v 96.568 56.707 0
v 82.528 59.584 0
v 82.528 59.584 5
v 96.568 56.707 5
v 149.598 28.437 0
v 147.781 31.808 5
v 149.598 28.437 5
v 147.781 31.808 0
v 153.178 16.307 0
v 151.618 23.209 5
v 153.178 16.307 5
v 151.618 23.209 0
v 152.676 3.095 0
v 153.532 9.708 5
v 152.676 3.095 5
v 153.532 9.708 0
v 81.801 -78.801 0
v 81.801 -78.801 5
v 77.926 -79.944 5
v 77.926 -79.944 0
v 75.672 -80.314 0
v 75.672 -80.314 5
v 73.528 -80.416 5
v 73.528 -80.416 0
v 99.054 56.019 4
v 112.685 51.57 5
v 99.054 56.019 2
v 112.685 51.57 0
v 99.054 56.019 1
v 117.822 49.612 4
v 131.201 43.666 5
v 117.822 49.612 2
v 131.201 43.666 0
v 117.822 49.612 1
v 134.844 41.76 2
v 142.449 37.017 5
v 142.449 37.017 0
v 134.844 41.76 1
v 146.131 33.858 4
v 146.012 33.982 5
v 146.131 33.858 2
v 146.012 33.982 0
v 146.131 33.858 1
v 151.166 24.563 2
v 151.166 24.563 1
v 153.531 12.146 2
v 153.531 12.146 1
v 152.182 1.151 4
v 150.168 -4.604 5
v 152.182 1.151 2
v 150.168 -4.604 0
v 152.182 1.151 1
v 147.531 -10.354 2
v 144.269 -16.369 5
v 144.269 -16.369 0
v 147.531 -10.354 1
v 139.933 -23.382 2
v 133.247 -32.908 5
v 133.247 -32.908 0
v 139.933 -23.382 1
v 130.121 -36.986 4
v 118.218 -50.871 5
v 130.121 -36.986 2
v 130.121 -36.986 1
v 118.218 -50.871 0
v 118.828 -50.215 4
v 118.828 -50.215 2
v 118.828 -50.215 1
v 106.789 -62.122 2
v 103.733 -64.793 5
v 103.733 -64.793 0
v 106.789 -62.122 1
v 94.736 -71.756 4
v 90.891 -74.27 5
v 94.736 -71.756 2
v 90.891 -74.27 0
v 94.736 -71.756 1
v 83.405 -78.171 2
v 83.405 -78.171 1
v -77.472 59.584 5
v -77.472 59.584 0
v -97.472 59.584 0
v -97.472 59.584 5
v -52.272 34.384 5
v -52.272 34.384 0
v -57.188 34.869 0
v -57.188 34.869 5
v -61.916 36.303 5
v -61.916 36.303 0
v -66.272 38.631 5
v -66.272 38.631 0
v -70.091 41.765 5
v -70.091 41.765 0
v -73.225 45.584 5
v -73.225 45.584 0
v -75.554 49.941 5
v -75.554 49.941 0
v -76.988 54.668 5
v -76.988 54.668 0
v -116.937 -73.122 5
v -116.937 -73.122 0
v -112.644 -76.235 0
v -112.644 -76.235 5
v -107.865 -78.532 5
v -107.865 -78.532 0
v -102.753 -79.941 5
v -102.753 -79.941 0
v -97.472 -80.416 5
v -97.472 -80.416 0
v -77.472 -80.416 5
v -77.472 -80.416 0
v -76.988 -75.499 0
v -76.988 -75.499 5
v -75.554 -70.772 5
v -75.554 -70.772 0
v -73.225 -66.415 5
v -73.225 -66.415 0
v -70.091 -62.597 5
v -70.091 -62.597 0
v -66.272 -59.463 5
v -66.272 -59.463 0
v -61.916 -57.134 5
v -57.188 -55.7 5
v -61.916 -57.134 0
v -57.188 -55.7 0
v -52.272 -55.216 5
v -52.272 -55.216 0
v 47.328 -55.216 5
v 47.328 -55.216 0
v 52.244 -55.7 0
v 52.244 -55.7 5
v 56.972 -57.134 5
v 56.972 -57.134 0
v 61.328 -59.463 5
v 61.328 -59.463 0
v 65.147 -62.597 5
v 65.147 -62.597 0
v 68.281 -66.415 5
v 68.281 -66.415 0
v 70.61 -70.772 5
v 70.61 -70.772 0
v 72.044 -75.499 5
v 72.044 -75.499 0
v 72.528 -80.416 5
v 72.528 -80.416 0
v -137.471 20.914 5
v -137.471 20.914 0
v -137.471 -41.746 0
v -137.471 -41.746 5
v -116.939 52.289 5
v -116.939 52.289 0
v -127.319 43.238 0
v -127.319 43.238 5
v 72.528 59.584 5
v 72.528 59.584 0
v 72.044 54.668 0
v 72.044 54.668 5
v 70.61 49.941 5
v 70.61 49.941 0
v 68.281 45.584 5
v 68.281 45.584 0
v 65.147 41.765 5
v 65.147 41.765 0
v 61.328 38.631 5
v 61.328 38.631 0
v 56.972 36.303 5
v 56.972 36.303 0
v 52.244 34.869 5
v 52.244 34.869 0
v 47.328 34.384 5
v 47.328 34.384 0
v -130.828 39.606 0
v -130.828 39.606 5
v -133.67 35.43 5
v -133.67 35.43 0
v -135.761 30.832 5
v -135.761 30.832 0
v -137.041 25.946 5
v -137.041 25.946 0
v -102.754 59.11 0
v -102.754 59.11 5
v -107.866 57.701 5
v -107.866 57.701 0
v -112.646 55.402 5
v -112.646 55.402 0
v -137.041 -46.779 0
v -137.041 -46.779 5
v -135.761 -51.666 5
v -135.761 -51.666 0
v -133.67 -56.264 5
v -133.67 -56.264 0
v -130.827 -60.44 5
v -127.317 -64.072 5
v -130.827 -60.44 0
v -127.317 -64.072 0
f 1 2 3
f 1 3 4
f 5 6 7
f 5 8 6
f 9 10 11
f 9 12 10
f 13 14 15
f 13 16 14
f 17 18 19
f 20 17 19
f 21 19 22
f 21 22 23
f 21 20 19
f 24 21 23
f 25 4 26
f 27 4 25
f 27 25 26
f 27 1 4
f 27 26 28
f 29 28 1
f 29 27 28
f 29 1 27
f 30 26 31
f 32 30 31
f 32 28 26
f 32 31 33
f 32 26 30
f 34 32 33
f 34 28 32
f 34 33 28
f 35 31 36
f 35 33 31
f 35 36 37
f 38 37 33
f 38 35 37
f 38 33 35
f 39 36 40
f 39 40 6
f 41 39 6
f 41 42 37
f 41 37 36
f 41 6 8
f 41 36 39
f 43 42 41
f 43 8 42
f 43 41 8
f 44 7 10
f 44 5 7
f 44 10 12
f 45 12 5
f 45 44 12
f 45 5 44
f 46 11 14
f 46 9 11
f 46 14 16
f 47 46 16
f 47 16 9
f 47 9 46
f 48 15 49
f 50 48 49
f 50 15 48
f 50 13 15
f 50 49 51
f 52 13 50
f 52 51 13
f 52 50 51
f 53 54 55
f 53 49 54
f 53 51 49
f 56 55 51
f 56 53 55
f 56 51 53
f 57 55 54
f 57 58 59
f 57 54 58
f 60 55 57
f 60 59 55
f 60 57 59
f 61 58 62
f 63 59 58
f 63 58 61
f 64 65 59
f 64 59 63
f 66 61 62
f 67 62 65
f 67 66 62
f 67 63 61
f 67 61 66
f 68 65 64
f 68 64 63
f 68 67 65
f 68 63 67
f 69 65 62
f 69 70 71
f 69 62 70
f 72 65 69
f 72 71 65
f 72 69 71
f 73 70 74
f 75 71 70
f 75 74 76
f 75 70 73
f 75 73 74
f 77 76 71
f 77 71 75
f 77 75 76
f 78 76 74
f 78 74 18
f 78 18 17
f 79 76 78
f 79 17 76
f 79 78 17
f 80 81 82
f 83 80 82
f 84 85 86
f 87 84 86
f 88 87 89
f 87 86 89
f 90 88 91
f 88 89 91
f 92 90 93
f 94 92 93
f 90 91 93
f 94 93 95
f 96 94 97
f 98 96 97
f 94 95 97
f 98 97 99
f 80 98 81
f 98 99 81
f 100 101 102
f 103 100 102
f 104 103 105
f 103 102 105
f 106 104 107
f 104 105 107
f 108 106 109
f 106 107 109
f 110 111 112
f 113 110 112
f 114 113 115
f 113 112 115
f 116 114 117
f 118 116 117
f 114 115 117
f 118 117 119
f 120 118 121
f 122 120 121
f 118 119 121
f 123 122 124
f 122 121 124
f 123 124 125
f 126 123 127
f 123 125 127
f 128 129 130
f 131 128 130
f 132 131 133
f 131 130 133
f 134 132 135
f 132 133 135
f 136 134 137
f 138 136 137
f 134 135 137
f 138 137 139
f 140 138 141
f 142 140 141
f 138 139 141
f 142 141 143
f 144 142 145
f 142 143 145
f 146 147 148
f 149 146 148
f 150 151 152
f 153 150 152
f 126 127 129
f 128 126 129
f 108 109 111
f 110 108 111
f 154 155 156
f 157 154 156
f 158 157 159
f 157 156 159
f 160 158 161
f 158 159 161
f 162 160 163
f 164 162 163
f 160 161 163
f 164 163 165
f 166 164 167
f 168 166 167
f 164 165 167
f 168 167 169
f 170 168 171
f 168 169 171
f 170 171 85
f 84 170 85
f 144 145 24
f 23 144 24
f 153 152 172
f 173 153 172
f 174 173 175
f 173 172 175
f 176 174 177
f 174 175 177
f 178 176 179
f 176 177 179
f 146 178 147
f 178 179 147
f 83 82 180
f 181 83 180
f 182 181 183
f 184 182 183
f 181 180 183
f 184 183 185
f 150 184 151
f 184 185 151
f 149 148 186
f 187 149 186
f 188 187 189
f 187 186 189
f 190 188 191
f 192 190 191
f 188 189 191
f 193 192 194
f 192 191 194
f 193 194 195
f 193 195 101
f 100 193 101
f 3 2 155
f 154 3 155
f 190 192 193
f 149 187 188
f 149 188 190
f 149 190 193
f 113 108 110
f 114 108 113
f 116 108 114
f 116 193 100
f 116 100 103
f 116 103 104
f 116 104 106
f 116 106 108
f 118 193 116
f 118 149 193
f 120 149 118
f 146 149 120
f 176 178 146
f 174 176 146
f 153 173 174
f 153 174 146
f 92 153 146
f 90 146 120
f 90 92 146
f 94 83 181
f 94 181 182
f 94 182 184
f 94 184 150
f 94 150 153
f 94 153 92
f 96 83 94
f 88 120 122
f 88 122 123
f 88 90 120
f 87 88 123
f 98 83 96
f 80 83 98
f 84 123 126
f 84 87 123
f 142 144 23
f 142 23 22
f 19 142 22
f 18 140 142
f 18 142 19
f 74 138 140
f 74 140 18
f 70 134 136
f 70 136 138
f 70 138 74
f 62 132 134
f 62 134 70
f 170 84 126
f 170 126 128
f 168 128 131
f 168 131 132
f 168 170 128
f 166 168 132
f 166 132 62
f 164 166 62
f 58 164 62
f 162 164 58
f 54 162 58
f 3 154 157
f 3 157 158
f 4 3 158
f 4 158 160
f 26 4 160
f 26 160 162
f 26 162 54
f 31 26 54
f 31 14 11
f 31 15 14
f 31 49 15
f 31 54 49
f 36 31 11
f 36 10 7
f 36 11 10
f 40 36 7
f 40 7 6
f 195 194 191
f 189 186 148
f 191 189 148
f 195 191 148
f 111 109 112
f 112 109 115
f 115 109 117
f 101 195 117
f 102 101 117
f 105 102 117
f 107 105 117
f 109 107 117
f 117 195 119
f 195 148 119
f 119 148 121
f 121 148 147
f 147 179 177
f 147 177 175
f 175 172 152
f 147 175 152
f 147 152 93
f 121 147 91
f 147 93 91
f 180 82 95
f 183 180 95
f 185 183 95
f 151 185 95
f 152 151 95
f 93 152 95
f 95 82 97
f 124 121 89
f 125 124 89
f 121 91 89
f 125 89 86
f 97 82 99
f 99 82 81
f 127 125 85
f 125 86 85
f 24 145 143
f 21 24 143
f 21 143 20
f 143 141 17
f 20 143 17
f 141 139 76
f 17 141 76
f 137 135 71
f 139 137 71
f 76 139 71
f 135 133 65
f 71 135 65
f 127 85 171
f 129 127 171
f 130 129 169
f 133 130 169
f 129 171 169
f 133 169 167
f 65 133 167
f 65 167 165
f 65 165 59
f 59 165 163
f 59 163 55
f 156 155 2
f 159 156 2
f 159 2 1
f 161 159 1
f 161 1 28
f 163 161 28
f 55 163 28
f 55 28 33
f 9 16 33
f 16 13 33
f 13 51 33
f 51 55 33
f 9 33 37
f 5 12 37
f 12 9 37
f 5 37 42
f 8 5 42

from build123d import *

# Parameters (mm, degrees)
BOSS_EXTRU_1_DEPTH = 5


with BuildPart() as part:
    # Esquisse1 → Boss.-Extru.1 (new body)
    with BuildSketch(Plane.XY):
        with BuildLine():
            Line((-77.472008168, 59.584338106), (-97.472008168, 59.584338106))
            ThreePointArc((-97.472008168, 59.584338106), (-107.866340849, 57.70059577), (-116.938550581, 52.288974233))
            Line((-116.938550581, 52.288974233), (-127.318550581, 43.23762235))
            ThreePointArc((-127.318550581, 43.23762235), (-134.813983205, 33.17575459), (-137.471408589, 20.913585802))
            Line((-137.471408589, 20.913585802), (-137.471408589, -41.746261473))
            ThreePointArc((-137.471408589, -41.746261473), (-134.813529559, -54.009427687), (-127.316898811, -64.071738255))
            Line((-127.316898811, -64.071738255), (-116.936898811, -73.121738255))
            ThreePointArc((-116.936898811, -73.121738255), (-107.865314786, -78.532304068), (-97.472008168, -80.415661894))
            Line((-97.472008168, -80.415661894), (-77.472008168, -80.415661894))
            ThreePointArc((-77.472008168, -80.415661894), (-70.091099054, -62.596571008), (-52.272008168, -55.215661894))
            Line((-52.272008168, -55.215661894), (47.327991832, -55.215661894))
            ThreePointArc((47.327991832, -55.215661894), (65.147082718, -62.596571008), (72.527991832, -80.415661894))
            Line((72.527991832, -80.415661894), (73.527991832, -80.415661894))
            add(Edge.make_bspline(
                [(82.527991832, 59.584338106), (101.294887559, 57.345225609), (142.468880392, 41.590471339), (150.722775832, 26.758890718), (154.234118929, 16.017198553), (151.364335726, -18.596789103), (97.275208729, -80.831964251), (73.527991832, -80.415661894)],
                knots=[0, 0, 0, 0, 0.313332962, 0.364624241, 0.496436288, 0.561621514, 1, 1, 1, 1], degree=3))
            Line((82.527991832, 59.584338106), (72.527991832, 59.584338106))
            ThreePointArc((72.527991832, 59.584338106), (65.147082718, 41.76524722), (47.327991832, 34.384338106))
            Line((47.327991832, 34.384338106), (-52.272008168, 34.384338106))
            ThreePointArc((-52.272008168, 34.384338106), (-70.091099054, 41.76524722), (-77.472008168, 59.584338106))
        make_face()
    extrude(amount=BOSS_EXTRU_1_DEPTH)


solid = part.part
